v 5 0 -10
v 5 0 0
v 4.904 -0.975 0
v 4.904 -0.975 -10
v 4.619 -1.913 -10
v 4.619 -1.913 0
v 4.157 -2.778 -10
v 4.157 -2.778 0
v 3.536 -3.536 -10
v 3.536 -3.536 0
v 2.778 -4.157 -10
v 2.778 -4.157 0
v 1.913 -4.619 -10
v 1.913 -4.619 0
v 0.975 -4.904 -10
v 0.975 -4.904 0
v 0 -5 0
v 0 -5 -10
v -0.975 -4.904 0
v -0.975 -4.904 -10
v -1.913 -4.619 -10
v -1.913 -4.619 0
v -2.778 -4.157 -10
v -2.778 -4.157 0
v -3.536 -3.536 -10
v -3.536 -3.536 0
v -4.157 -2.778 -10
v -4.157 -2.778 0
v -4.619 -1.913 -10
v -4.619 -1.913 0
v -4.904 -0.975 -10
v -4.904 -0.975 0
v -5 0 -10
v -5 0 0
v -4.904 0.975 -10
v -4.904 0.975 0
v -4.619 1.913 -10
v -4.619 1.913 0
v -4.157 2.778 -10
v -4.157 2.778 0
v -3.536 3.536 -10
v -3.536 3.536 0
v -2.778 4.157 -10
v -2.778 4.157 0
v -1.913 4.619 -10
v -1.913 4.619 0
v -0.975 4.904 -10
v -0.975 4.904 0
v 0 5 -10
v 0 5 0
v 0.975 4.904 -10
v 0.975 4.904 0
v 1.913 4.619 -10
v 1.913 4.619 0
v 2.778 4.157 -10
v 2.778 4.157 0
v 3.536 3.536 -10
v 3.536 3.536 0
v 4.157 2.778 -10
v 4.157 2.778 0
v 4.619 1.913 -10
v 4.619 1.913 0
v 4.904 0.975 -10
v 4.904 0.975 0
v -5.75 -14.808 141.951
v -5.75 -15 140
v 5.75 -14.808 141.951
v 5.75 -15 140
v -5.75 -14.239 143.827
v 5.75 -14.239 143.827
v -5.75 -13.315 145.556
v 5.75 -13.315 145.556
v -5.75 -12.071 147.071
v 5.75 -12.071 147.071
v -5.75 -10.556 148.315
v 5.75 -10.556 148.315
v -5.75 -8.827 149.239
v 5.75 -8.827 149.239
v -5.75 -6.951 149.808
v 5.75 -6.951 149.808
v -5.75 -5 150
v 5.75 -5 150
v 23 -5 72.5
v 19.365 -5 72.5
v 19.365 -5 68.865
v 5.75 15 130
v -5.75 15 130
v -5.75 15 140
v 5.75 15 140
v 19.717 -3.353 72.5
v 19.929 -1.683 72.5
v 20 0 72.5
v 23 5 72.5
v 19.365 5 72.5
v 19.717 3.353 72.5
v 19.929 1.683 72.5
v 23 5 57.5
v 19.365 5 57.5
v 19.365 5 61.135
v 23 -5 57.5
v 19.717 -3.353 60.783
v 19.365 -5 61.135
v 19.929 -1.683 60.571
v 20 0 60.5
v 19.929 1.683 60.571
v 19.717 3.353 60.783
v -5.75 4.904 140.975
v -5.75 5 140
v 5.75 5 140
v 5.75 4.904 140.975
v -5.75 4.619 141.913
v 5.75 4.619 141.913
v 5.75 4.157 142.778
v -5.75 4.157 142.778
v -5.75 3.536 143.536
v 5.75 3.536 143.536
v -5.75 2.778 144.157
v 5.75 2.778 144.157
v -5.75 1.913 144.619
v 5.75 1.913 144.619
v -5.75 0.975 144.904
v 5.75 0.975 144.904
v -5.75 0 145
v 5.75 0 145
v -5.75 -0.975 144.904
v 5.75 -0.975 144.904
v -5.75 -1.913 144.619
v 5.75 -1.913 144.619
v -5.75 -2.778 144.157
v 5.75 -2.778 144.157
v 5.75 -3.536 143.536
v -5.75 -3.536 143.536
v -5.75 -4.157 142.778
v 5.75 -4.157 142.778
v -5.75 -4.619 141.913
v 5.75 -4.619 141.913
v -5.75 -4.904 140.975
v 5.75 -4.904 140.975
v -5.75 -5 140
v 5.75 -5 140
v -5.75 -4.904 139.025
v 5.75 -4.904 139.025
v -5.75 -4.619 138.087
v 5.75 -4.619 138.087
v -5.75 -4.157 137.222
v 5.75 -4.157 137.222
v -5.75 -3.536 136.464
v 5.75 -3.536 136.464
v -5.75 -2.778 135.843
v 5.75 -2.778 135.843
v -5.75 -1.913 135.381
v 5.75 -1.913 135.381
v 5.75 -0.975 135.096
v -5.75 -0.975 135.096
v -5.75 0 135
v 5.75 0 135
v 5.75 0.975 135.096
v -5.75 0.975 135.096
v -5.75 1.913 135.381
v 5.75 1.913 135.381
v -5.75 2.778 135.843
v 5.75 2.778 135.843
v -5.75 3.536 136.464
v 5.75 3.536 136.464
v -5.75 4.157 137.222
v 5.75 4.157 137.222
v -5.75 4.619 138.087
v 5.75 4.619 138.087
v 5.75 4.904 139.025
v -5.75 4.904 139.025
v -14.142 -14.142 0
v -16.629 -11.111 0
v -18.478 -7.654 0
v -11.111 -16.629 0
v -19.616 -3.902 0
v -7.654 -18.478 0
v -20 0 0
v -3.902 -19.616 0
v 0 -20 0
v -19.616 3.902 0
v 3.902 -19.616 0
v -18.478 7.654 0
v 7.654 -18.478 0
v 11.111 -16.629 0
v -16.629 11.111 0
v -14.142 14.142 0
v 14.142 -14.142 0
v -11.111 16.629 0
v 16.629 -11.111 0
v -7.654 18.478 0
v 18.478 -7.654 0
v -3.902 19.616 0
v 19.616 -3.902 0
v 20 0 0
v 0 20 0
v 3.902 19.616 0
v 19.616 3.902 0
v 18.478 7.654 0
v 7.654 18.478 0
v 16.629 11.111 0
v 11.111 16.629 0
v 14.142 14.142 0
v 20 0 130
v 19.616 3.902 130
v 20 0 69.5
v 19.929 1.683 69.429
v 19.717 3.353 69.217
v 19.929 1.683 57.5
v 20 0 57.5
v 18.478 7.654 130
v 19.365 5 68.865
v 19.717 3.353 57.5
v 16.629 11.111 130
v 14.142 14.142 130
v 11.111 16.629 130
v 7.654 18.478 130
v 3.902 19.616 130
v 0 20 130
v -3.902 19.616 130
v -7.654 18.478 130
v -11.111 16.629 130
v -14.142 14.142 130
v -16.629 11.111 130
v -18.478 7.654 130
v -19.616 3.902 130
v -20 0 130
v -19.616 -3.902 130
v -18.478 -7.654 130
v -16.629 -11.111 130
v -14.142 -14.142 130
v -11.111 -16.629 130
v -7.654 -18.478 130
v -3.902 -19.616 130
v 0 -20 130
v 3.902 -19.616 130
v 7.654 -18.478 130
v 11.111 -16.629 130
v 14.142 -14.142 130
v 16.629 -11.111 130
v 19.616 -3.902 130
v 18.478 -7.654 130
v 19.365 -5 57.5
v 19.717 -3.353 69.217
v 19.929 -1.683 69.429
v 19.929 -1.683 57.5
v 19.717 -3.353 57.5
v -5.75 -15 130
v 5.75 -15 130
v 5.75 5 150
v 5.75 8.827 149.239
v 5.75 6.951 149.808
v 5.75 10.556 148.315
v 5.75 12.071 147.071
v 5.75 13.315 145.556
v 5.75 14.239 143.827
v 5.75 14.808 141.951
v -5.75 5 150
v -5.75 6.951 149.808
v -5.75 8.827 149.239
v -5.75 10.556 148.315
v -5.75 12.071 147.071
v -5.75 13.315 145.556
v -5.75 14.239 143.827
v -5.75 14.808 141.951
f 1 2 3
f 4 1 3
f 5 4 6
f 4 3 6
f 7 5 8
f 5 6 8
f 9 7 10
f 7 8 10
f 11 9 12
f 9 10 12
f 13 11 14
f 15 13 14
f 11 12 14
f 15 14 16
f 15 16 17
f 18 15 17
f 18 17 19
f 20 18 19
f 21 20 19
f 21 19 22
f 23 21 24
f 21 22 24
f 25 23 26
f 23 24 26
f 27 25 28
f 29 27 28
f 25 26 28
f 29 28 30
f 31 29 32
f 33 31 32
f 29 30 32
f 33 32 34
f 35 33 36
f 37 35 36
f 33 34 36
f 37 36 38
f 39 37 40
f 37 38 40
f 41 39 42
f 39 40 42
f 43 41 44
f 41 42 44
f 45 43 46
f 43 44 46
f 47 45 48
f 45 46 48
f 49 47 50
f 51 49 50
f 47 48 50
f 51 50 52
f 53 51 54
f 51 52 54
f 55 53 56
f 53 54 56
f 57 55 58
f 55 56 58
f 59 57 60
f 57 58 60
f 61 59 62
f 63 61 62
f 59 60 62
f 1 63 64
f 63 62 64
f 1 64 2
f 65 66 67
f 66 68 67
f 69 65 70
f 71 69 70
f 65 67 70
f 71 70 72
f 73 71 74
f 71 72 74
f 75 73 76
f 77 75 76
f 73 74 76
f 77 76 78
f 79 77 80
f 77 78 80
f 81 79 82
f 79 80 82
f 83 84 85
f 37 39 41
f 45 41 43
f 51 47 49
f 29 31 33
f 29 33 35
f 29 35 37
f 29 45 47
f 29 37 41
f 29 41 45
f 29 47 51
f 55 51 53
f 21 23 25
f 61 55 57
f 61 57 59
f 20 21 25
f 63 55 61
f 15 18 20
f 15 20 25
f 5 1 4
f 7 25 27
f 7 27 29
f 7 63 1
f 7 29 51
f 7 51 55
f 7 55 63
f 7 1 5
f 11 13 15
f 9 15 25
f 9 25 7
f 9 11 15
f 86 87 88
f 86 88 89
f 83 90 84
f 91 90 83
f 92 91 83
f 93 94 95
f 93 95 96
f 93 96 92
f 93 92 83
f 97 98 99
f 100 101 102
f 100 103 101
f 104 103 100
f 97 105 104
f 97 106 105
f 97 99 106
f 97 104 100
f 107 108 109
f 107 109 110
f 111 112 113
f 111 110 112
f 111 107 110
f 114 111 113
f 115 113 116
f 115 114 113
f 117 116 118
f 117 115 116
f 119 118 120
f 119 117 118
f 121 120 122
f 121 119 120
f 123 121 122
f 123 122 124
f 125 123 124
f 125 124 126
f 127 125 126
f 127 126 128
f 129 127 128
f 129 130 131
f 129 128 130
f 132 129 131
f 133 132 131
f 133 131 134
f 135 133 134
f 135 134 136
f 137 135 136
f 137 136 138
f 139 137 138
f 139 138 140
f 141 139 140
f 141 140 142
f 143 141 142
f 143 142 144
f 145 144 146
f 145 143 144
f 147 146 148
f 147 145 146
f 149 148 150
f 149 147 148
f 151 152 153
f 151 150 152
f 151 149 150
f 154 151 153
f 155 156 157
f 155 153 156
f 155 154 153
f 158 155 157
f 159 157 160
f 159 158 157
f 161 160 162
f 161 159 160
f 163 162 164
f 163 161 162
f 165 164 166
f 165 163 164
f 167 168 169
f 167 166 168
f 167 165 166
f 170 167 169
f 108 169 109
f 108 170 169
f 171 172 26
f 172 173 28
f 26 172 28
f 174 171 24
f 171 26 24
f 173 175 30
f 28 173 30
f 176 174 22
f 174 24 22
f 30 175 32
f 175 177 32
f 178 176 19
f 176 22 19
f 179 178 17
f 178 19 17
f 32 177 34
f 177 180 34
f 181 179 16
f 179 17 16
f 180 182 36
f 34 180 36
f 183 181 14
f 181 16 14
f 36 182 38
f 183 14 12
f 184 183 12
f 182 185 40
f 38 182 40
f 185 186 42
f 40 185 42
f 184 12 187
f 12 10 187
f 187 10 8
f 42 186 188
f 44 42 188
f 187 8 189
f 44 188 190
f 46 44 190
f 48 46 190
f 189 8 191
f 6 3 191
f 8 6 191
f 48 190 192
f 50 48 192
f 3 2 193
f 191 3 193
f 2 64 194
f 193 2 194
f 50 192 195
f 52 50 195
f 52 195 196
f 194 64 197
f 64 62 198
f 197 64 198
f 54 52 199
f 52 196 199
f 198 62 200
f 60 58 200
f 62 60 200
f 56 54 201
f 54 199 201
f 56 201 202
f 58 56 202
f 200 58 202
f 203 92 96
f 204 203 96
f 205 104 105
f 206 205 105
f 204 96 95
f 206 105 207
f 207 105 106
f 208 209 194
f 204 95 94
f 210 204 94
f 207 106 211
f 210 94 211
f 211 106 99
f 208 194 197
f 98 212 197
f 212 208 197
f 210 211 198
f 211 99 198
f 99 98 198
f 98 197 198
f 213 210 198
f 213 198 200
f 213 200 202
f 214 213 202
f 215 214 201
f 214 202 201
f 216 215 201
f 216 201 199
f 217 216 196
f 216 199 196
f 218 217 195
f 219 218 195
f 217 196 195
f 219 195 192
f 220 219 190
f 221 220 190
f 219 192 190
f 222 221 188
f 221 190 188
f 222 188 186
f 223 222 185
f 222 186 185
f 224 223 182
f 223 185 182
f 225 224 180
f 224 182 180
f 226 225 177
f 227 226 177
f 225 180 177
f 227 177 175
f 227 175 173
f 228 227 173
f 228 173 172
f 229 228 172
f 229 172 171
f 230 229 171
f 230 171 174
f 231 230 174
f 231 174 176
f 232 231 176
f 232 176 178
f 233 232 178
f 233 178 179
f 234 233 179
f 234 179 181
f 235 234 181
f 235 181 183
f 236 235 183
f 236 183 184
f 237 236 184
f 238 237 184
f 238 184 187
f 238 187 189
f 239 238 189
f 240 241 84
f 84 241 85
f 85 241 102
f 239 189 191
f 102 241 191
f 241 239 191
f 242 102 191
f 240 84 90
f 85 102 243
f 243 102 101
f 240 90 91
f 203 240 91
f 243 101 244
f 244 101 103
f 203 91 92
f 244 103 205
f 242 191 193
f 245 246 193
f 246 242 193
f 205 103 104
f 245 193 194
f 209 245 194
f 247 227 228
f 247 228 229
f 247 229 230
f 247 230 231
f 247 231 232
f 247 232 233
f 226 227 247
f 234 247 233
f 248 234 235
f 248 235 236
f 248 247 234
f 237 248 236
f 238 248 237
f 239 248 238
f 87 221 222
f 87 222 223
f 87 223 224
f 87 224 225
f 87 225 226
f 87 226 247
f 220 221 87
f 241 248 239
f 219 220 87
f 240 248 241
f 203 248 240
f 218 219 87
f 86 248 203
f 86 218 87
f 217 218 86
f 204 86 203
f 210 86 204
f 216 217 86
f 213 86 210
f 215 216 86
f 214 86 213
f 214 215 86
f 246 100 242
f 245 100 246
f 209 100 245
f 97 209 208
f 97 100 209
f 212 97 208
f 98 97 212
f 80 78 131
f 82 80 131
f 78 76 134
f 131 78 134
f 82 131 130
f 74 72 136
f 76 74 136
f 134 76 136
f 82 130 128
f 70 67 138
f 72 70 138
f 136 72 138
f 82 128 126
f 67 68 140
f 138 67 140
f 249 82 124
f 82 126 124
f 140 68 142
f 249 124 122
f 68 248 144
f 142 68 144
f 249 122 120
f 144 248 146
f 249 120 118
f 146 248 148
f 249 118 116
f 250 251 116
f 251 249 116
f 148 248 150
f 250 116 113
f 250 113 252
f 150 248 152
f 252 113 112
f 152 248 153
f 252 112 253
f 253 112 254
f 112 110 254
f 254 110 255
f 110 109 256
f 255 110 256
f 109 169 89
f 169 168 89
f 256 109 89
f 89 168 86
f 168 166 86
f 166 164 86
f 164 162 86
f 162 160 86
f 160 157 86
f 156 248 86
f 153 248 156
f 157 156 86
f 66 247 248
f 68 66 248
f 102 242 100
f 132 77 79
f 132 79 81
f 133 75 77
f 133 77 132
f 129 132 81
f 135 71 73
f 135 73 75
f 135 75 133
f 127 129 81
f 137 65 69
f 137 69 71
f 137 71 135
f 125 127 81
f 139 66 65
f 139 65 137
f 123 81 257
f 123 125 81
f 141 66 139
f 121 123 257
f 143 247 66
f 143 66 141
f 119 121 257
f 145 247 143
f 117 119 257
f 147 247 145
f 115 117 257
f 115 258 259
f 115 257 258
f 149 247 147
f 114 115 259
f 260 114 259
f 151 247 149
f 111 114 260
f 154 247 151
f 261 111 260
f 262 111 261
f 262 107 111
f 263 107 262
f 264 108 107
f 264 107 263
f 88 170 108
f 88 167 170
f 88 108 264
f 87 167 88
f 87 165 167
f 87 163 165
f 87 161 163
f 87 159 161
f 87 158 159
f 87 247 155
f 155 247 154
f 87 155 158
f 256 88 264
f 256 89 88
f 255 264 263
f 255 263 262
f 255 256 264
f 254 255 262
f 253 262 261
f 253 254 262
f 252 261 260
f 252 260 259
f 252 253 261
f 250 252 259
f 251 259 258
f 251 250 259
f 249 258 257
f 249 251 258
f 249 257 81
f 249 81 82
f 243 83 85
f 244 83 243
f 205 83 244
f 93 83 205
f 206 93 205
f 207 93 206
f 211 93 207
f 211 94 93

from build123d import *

# Parameters (mm, degrees)
SKETCH1_R               = 20
BOSS_EXTRUDE1_DEPTH     = 130
BOSS_EXTRUDE2_DEPTH     = 5
SKETCH3_R               = 5
BOSS_EXTRUDE3_DEPTH     = 10
SKETCH4_W               = 11.5
SKETCH4_H               = 30
BOSS_EXTRUDE4_DEPTH     = 20
FILLET1_R               = 10
CUT_EXTRUDE1_DEPTH      = 154.502646557
CUT_EXTRUDE1_DEPTH_BACK = 154.502646557
SKETCH5_R               = 5


with BuildPart() as part:
    # Sketch1 → Boss-Extrude1 (new body)
    with BuildSketch(Plane.XY):
        Circle(SKETCH1_R)
    extrude(amount=BOSS_EXTRUDE1_DEPTH)

    # Sketch2 → Boss-Extrude2 (add, symmetric)
    with BuildSketch(Plane(origin=(0, 0, 0), x_dir=(1, 0, 0), z_dir=(0, 1, 0))):
        Polygon((23, -72.5), (15.5, -65), (23, -57.5), (8, -57.5), (8, -72.5), align=None)
    extrude(amount=BOSS_EXTRUDE2_DEPTH, both=True)

    # Sketch3 → Boss-Extrude3 (add)
    with BuildSketch(Plane(origin=(0, 0, 0), x_dir=(-1, 0, 0), z_dir=(0, 0, -1))):
        with Locations(Location((0, 0, 0), (0, 0, 180))):
            Circle(SKETCH3_R)
    extrude(amount=BOSS_EXTRUDE3_DEPTH)

    # Sketch4 → Boss-Extrude4 (add)
    with BuildSketch(Plane.XY.offset(130)):
        Rectangle(SKETCH4_W, SKETCH4_H)
    extrude(amount=BOSS_EXTRUDE4_DEPTH)

    # Fillet1
    fillet1_edges = [part.edges().sort_by_distance(p)[0] for p in [
        (0, -15, 150),
        (0, 15, 150),
    ]]
    fillet(fillet1_edges, radius=FILLET1_R)

    # Sketch5 → Cut-Extrude1 (cut, two sides: drawn at the far end of the back side and taken through both)
    with BuildSketch(Plane(origin=(5.75, 0, 0), x_dir=(0, 0, -1), z_dir=(1, 0, 0)).offset(-CUT_EXTRUDE1_DEPTH_BACK)):
        with Locations(Location((-140, 0, 0), (0, 0, 90))):
            Circle(SKETCH5_R)
    extrude(amount=CUT_EXTRUDE1_DEPTH + CUT_EXTRUDE1_DEPTH_BACK, mode=Mode.SUBTRACT)


solid = part.part
